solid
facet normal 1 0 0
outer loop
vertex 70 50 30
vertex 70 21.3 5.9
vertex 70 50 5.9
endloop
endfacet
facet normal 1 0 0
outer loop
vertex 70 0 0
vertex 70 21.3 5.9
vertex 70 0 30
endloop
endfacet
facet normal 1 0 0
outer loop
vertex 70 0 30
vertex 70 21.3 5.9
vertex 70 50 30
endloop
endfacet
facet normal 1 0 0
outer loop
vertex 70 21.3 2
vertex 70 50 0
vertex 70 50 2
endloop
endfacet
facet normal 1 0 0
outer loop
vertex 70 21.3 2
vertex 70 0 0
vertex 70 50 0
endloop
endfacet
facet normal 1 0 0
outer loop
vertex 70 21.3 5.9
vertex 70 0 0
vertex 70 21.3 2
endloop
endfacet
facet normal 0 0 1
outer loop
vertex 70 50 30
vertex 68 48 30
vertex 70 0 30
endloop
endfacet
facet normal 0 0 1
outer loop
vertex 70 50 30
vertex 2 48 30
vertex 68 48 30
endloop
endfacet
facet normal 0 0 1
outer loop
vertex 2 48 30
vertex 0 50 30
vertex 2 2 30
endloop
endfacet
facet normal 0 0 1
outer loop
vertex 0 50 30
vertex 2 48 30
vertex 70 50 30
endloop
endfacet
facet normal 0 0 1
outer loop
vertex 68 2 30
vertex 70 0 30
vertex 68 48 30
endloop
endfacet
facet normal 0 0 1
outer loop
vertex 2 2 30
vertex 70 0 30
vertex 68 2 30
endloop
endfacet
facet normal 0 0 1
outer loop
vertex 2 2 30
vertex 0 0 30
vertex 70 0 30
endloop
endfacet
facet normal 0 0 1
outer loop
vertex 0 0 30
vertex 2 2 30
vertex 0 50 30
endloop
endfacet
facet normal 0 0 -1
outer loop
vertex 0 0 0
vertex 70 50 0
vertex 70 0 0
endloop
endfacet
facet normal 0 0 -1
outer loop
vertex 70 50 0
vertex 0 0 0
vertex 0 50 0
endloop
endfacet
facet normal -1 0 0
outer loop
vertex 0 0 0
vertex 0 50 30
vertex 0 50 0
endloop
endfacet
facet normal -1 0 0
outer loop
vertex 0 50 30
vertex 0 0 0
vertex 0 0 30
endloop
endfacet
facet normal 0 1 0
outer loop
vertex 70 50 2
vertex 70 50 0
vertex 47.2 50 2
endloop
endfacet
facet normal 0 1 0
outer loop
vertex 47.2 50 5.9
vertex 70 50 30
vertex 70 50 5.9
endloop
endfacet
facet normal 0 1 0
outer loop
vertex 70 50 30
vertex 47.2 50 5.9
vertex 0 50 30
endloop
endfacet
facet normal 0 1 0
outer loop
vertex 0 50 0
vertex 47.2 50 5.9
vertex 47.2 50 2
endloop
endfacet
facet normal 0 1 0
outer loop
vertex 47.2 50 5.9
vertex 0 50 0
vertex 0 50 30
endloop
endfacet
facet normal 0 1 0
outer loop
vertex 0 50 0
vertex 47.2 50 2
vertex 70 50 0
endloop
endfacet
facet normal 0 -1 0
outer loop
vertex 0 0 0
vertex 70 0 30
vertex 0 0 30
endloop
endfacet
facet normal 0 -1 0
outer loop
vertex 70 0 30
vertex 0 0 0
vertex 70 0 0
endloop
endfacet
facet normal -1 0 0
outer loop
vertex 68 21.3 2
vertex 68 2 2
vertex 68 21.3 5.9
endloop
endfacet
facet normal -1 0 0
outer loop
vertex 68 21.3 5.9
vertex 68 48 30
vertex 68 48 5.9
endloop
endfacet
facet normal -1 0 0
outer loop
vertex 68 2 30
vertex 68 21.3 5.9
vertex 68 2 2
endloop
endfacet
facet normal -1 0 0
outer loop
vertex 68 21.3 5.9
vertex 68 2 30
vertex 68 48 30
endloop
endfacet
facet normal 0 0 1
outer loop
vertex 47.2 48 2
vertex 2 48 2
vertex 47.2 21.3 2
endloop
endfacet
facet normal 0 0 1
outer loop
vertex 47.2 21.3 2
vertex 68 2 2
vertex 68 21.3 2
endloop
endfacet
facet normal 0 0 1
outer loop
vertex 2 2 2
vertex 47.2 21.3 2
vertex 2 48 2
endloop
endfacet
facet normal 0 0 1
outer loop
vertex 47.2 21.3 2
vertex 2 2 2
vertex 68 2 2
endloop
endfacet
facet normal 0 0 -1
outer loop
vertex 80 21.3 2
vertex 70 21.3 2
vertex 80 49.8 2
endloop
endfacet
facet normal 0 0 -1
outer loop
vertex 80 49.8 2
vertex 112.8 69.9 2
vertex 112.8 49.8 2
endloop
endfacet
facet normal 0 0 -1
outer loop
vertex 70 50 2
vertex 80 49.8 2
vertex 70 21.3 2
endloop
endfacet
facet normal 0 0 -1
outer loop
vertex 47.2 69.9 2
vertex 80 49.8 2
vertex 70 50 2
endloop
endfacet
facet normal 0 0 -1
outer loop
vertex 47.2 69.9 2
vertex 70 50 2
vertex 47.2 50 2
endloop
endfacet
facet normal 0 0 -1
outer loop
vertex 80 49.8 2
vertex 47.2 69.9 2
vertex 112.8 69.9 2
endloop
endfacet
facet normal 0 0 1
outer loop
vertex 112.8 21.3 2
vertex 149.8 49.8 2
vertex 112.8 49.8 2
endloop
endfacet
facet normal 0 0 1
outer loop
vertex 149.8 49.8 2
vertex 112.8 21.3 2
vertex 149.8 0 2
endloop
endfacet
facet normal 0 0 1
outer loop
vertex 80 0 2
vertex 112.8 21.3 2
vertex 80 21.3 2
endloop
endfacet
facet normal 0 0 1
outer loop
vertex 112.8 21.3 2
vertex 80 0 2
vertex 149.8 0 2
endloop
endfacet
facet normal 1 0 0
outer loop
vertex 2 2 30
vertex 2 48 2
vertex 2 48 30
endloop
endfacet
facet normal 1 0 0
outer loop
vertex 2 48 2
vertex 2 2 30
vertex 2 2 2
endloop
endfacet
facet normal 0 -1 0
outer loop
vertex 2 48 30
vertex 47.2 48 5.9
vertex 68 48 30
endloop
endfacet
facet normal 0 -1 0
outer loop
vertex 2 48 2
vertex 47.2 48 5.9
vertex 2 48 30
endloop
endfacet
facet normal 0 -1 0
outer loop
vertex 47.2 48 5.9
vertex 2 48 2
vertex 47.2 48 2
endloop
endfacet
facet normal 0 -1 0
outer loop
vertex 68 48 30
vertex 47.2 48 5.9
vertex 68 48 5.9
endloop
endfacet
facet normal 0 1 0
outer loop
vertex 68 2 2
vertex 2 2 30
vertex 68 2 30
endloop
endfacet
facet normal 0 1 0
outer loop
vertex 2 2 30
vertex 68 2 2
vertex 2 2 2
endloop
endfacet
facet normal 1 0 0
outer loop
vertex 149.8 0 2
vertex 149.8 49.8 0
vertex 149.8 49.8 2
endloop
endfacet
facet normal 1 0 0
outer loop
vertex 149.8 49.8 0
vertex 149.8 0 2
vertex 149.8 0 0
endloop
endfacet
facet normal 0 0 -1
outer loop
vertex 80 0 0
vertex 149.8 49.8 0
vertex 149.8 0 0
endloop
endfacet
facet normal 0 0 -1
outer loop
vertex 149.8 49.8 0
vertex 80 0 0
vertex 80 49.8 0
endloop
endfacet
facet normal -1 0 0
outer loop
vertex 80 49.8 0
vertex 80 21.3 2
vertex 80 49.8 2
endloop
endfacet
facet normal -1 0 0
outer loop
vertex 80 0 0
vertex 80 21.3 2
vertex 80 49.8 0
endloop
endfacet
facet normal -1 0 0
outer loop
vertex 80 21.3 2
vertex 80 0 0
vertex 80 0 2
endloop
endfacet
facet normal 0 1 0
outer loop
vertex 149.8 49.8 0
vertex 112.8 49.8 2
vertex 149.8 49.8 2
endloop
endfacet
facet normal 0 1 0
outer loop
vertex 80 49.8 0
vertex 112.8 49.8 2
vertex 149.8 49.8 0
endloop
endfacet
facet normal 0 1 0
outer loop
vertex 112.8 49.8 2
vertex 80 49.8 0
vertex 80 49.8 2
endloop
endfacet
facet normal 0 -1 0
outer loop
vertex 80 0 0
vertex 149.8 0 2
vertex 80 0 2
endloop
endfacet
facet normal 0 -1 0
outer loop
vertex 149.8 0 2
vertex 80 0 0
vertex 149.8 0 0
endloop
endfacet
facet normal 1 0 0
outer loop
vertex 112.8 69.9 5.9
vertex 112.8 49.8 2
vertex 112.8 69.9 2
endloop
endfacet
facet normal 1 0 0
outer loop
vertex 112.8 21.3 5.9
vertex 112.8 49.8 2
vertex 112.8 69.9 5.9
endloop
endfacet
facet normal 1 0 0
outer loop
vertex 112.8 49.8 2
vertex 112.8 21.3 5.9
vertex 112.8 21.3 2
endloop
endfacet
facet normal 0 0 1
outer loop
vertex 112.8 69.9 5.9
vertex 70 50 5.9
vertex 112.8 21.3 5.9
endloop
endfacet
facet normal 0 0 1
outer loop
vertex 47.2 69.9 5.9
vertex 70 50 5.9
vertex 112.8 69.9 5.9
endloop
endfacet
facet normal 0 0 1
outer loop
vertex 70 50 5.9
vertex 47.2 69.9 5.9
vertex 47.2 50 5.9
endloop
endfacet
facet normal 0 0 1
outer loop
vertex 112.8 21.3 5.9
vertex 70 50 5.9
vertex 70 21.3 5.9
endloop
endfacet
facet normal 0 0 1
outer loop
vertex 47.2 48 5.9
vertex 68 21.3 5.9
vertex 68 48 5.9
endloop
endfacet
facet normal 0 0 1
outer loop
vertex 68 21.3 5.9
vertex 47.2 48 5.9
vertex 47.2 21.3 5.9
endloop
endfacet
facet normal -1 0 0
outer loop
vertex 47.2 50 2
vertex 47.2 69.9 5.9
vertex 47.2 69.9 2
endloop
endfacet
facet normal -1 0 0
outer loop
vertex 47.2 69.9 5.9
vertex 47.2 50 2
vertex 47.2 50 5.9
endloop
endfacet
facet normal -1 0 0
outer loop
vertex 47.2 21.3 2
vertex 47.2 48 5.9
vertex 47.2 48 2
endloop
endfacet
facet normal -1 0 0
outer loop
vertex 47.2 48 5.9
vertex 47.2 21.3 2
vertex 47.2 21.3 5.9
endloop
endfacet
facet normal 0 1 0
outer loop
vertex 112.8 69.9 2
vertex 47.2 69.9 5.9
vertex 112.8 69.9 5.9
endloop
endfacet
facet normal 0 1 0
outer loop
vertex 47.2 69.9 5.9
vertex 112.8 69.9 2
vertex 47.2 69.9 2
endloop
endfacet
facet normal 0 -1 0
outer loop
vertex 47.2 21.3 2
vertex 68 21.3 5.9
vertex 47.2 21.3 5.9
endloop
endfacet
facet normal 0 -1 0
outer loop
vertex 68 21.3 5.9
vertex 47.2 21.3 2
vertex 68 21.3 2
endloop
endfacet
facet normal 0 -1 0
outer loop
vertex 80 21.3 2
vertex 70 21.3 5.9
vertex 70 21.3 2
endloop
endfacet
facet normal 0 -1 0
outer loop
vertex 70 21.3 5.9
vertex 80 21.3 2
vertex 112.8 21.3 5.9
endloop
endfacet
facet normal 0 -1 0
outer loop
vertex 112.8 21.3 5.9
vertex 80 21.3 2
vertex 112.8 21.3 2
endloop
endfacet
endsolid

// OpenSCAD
// Two-part enclosure for a small electronics board (e.g. Arduino-based logger)
// Print orientation: box on the bed (z = 0), lid on top (+Z), side by side.

$fn = 64;

// ---- Box (Part 1) ----
box_x      = 70;    // outer length in X
box_y      = 50;    // outer width in Y
box_z      = 30;    // outer height in Z
box_wall   = 2;     // wall thickness (sides and top)
box_floor  = 2;     // floor thickness (bottom)

// ---- Lid (Part 2) ----
lip_x      = 65.6;  // outer length of lip in X
lip_y      = 45.6;  // outer width of lip in Y
lip_h      = 4;     // lip height above plate
lip_t      = 1.5;   // lip wall thickness
plate_t    = 2;     // lid plate thickness
overlap    = 0.1;   // lip sinks into plate for a clean union

// ---- Layout ----
gap        = 10;    // gap between the two parts along X

// ---- Model ----
union() {
    // Box: hollow rectangle, open top
    difference() {
        cube([box_x, box_y, box_z]);
        translate([box_wall, box_wall, box_floor])
            cube([box_x - 2 * box_wall, box_y - 2 * box_wall, box_z - box_floor]);
    }

    // Lid: base plate with a rectangular lip on top
    union() {
        translate([box_x + gap, 0, 0])
            cube([lip_x + 2 * (box_wall + overlap), lip_y + 2 * (box_wall + overlap), plate_t]);
        translate([box_x + gap - lip_x / 2, lip_y / 2 - lip_t, plate_t])
            cube([lip_x, lip_y + 2 * lip_t, lip_h - overlap]);
    }
}
